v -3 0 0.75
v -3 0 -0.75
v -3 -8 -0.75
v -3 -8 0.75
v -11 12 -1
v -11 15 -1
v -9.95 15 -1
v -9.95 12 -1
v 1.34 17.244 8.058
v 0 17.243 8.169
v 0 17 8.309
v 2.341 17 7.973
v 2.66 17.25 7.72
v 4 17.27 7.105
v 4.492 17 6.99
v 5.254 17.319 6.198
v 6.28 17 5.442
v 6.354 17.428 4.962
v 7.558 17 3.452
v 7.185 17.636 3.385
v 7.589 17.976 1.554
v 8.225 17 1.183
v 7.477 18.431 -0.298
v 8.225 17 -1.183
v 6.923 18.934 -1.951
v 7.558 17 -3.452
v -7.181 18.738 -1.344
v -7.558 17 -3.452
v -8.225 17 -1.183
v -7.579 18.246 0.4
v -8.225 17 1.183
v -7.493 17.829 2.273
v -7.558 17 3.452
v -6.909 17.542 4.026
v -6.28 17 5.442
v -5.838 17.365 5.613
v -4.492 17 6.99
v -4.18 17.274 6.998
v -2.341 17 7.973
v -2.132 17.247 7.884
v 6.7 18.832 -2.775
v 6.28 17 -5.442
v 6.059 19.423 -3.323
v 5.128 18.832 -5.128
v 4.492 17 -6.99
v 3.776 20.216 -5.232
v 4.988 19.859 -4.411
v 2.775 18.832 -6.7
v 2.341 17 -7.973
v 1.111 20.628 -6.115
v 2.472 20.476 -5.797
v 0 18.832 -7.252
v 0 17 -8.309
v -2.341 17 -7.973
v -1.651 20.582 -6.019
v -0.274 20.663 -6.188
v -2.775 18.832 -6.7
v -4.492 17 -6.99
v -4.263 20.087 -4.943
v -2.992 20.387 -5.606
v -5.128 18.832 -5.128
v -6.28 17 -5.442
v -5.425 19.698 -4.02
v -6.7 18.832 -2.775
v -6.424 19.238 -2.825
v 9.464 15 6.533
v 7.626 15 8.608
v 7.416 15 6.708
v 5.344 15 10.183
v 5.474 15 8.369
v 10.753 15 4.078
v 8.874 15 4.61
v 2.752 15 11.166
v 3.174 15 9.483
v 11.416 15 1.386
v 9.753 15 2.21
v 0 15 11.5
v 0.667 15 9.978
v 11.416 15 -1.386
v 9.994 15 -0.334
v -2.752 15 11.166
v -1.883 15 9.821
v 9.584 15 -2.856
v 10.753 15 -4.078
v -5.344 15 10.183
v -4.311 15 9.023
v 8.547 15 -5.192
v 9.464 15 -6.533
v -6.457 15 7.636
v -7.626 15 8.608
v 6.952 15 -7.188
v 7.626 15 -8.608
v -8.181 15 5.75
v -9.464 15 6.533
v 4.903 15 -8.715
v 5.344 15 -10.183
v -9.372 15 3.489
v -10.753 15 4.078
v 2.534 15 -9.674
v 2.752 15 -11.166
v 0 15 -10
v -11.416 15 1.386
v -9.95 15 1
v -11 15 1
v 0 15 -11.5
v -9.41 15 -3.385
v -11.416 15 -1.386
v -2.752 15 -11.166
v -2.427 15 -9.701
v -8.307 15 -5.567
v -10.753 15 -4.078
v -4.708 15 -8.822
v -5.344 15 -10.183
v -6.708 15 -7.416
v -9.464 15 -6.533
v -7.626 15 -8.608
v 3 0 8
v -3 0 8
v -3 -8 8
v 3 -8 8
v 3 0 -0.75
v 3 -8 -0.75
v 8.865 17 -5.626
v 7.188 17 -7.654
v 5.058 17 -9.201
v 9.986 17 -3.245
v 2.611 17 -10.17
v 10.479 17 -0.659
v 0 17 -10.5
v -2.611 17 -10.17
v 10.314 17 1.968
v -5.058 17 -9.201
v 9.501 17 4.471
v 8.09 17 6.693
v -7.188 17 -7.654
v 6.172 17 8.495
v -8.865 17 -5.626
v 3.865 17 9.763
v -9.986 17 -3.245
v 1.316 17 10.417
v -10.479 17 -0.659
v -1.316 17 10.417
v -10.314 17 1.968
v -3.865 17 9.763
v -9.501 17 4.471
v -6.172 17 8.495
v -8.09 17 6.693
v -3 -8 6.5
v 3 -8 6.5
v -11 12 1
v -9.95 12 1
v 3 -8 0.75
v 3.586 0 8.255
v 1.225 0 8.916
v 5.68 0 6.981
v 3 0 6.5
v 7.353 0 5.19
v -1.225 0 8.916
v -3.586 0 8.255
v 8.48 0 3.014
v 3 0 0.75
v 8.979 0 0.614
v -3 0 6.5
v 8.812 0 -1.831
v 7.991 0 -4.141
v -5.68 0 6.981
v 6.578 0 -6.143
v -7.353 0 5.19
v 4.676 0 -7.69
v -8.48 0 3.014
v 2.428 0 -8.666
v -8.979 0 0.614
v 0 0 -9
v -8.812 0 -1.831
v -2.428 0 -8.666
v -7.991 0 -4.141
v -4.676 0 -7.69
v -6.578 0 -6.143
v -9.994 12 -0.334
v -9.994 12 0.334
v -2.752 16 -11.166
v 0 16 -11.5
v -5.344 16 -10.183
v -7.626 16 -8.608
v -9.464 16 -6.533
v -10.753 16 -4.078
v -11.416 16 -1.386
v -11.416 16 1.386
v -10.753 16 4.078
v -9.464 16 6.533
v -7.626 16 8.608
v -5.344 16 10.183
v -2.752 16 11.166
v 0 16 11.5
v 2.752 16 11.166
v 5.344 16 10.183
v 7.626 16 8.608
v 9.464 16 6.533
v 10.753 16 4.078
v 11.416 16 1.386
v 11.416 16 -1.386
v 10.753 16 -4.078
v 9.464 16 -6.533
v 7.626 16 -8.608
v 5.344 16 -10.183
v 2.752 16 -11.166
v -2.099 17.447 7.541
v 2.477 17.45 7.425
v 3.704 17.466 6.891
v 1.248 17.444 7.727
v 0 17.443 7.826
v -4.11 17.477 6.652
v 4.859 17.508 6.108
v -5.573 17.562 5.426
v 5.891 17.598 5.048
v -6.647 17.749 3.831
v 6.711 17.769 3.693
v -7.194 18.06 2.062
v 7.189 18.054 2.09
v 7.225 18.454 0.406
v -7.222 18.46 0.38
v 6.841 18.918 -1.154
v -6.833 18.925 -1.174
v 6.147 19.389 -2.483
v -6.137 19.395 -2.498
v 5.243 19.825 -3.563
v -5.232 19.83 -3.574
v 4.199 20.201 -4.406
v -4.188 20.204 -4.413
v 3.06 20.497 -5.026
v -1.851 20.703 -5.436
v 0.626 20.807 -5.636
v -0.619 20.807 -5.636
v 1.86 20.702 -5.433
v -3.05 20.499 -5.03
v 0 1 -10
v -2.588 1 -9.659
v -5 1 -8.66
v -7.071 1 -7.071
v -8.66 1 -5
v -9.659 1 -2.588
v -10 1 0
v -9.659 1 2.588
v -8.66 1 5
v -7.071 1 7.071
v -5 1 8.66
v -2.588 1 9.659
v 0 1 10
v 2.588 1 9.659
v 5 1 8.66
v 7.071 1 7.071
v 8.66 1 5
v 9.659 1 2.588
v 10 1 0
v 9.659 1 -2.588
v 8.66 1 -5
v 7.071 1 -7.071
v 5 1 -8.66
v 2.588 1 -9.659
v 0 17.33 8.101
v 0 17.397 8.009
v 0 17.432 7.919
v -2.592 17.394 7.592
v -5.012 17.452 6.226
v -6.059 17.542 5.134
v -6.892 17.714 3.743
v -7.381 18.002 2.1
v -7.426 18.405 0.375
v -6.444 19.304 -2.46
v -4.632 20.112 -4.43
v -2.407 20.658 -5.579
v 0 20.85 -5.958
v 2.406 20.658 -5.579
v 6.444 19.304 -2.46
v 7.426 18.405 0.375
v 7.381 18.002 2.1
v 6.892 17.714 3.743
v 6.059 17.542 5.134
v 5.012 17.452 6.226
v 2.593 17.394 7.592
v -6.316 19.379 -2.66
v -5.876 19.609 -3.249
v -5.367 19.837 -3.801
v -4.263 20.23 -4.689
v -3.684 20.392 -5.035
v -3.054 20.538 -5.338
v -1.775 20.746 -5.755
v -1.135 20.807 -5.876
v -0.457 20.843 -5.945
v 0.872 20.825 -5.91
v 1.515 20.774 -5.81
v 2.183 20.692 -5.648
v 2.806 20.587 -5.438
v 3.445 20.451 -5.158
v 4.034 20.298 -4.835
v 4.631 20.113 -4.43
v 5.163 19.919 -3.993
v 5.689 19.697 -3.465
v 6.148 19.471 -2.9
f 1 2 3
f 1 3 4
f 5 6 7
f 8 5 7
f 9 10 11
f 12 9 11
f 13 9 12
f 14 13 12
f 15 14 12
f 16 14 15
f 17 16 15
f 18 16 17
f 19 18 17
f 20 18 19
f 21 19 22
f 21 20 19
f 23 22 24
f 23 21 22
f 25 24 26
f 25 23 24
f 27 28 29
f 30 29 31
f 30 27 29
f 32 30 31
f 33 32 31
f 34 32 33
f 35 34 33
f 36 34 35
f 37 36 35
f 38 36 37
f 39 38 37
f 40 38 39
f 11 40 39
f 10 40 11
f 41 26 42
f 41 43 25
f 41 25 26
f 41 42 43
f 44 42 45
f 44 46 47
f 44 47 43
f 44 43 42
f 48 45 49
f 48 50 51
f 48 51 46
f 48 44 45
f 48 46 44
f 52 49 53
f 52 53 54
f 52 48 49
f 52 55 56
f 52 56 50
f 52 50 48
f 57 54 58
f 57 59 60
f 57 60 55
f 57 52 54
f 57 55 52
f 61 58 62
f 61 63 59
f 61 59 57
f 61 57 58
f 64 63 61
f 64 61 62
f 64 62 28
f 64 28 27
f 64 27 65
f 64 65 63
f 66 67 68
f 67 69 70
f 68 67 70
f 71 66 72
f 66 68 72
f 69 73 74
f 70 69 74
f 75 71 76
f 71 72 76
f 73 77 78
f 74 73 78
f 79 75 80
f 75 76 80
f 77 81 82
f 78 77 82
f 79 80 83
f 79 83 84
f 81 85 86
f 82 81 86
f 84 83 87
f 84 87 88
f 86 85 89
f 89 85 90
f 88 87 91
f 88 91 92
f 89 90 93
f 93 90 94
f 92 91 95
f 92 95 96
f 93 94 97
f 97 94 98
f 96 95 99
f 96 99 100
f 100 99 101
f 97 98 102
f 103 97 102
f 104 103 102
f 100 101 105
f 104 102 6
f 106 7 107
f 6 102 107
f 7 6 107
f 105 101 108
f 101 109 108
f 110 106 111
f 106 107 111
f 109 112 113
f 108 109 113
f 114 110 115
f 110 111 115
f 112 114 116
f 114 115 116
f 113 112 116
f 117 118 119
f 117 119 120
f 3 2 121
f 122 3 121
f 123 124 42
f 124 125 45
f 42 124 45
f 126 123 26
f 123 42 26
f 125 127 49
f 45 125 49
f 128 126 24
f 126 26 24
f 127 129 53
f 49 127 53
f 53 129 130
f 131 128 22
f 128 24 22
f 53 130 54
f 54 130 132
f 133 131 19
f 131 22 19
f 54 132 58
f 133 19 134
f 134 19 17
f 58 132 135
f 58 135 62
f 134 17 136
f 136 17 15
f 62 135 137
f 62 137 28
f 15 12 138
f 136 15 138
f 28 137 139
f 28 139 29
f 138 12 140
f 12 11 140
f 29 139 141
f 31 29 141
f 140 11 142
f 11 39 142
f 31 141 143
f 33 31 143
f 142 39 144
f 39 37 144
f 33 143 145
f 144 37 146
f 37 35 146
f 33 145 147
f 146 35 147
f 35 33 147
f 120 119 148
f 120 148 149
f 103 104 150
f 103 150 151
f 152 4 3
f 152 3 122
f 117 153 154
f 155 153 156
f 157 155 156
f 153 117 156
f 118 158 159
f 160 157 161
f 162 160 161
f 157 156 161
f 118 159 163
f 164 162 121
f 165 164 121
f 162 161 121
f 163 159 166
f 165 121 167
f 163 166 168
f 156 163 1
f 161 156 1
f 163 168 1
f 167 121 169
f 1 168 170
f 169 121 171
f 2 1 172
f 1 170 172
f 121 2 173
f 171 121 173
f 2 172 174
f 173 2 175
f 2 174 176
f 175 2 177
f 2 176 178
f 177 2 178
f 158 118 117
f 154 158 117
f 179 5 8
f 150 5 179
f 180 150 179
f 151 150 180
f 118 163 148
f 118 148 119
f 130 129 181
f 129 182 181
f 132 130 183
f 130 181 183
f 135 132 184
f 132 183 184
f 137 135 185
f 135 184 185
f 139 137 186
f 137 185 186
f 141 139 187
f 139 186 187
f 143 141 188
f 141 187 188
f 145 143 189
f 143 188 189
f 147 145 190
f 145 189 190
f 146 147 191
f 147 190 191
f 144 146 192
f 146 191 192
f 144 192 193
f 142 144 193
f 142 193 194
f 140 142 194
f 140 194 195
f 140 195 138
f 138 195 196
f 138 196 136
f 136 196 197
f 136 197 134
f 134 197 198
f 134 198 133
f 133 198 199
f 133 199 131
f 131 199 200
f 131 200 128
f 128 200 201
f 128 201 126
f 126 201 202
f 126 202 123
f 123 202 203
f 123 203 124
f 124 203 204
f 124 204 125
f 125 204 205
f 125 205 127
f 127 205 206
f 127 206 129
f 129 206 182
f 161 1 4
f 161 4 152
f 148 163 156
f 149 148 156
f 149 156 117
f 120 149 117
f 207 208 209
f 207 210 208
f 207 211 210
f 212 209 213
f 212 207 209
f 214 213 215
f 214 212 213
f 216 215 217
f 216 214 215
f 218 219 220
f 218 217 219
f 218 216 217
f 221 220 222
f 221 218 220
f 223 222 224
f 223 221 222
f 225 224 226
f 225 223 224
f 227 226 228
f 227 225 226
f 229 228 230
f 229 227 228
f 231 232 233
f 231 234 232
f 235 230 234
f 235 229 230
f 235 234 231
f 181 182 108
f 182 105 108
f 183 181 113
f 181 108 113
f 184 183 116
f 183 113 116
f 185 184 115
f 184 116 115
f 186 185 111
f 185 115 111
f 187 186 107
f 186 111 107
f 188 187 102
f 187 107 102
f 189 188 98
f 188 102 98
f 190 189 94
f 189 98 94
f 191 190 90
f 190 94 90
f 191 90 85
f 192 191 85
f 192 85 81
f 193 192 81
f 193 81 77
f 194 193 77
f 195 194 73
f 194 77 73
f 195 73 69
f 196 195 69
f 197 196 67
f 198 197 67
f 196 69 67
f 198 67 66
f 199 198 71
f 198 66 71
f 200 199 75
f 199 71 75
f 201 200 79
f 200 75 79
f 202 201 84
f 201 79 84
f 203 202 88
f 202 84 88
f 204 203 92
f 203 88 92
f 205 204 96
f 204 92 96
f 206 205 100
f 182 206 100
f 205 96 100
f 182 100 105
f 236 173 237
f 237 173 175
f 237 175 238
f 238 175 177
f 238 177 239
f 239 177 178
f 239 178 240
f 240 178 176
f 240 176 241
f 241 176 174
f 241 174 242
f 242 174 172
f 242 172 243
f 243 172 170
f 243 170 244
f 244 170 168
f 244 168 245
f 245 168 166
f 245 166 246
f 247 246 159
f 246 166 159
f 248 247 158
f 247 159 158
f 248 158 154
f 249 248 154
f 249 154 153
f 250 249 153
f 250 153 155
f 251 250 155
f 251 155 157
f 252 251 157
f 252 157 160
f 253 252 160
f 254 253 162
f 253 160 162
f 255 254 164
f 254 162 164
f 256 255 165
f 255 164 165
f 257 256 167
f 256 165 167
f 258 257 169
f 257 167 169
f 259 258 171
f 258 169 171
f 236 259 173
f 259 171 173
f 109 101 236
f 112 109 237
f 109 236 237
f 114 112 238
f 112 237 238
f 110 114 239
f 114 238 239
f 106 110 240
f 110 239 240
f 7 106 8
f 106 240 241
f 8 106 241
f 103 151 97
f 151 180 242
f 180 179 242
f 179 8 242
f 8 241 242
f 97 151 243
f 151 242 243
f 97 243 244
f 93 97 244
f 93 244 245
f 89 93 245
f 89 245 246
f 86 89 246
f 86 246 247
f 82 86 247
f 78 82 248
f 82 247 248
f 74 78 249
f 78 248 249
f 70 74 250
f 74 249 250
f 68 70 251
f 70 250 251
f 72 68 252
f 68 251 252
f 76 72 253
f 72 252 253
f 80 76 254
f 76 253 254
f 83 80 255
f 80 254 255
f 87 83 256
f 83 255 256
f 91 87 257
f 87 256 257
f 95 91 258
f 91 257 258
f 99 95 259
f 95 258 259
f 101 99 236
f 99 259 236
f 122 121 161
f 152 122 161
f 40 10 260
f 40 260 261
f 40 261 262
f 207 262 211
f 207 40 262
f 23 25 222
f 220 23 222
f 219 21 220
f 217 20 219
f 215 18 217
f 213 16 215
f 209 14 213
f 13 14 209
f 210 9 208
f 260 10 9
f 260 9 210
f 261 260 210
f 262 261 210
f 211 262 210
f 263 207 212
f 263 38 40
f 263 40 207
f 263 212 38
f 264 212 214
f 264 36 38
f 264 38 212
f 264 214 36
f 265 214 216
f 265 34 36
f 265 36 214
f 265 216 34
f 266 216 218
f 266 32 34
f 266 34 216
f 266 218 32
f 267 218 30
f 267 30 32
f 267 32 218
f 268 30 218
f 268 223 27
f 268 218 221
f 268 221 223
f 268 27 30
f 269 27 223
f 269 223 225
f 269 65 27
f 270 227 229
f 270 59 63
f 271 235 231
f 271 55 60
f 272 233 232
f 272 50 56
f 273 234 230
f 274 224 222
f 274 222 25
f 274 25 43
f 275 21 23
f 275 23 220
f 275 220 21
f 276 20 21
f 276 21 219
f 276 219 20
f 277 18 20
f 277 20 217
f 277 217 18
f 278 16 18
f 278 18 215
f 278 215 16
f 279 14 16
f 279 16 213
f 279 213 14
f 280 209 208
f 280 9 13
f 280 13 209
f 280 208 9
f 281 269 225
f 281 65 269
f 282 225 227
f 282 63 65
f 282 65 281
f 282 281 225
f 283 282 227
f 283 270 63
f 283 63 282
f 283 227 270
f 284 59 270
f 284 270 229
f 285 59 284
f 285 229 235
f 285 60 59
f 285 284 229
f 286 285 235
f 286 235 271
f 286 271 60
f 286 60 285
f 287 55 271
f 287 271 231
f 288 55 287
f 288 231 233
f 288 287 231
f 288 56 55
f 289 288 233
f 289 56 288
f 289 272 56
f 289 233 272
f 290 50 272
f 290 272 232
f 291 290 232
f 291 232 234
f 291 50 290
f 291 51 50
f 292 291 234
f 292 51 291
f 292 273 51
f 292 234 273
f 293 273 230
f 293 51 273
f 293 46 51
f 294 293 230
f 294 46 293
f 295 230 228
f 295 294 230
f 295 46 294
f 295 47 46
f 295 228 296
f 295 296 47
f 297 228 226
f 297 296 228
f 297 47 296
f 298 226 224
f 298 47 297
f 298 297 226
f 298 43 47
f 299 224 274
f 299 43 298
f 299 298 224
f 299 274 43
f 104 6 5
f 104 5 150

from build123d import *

# Parameters (mm, degrees)
SKETCH3_R               = 9
BOSS_EXTRUDE1_DEPTH     = 4
CHAMFER1_SIZE           = 5.196152423
CHAMFER1_SIZE_2         = 3
CUT_EXTRUDE2_DEPTH      = 27.561249971
CUT_EXTRUDE2_DEPTH_BACK = 27.561249971
FILLET1_R               = 0.4
SKETCH6_W               = 1.050125629
SKETCH6_H               = 2
BOSS_EXTRUDE2_DEPTH     = 3
SKETCH7_W               = 6
SKETCH7_H               = 1.5
BOSS_EXTRUDE3_DEPTH     = 8
CHAMFER2_SIZE           = 1


with BuildPart() as part:
    # Sketch2 → Revolve1 (revolve)
    with BuildSketch(Plane(origin=(0, 0, 0), x_dir=(0, 0, -1), z_dir=(1, 0, 0))):
        Polygon((0, 0), (0, 17), (10.5, 17), (11.5, 16), (11.5, 15), (10, 15), (10, 0), align=None)
    revolve(axis=Axis((0, 0, 0), (0, 1, 0)))

    # Sketch3 → Boss-Extrude1 (add)
    with BuildSketch(Plane(origin=(0, 17, 0), x_dir=(1, 0, 0), z_dir=(0, 1, 0))):
        with Locations(Location((0, 0, 0), (0, 0, 270))):
            Circle(SKETCH3_R)
    extrude(amount=BOSS_EXTRUDE1_DEPTH)

    # Chamfer1
    # the kernel refuses this chamfer: 5.196152423, 3 mm, written as the material it takes off along each edge
    with BuildSketch(Plane(origin=(0, 21, 0), x_dir=(0, 0, 1), z_dir=(-1, 0, 0))) as chamfer1_piece_1_section:
        Polygon((9, -CHAMFER1_SIZE), (9 - CHAMFER1_SIZE_2, 0), (9, 0), align=None)
    chamfer1_piece_1 = revolve(axis=Axis((0, 21, 0), (0, 1, 0)), mode=Mode.PRIVATE)
    chamfer1_piece_1 = split(chamfer1_piece_1, bisect_by=Plane(origin=(0, 17, -7.167132971), z_dir=(0, 1, 0)), keep=Keep.TOP, mode=Mode.PRIVATE)
    add(chamfer1_piece_1, mode=Mode.SUBTRACT)

    # Sketch5 → Cut-Extrude2 (cut, two sides: drawn at the far end of the back side and taken through both)
    with BuildSketch(Plane(origin=(0, 0, 0), x_dir=(0, 0, -1), z_dir=(1, 0, 0)).offset(-CUT_EXTRUDE2_DEPTH_BACK)):
        with BuildLine():
            Line((6, 21), (-6, 21))
            Line((-6, 21), (-8.085535149, 17.44220036))
            ThreePointArc((-8.085535149, 17.44220036), (-0.821567104, 18.345354686), (6, 21))
        make_face()
    extrude(amount=CUT_EXTRUDE2_DEPTH + CUT_EXTRUDE2_DEPTH_BACK, mode=Mode.SUBTRACT)

    # Fillet1
    fillet1_edges = [part.edges().sort_by_distance(p)[0] for p in [
        (-9.3e-08, 21, -6),
    ]]
    fillet(fillet1_edges, radius=FILLET1_R)

    # Sketch6 → Boss-Extrude2 (add)
    with BuildSketch(Plane.XZ.offset(-15)):
        with Locations((-10.474937185, 0)):
            Rectangle(SKETCH6_W, SKETCH6_H)
    extrude(amount=BOSS_EXTRUDE2_DEPTH)

    # Sketch7 → Boss-Extrude3 (add)
    with BuildSketch(Plane.XZ):
        Rectangle(SKETCH7_W, SKETCH7_H)
        with Locations((0, 7.25)):
            Rectangle(SKETCH7_W, SKETCH7_H)
    extrude(amount=BOSS_EXTRUDE3_DEPTH)

    # Chamfer2
    chamfer2_edges = [part.edges().sort_by_distance(p)[0] for p in [
        (0, 0, 10),
    ]]
    chamfer(chamfer2_edges, length=CHAMFER2_SIZE)


solid = part.part
